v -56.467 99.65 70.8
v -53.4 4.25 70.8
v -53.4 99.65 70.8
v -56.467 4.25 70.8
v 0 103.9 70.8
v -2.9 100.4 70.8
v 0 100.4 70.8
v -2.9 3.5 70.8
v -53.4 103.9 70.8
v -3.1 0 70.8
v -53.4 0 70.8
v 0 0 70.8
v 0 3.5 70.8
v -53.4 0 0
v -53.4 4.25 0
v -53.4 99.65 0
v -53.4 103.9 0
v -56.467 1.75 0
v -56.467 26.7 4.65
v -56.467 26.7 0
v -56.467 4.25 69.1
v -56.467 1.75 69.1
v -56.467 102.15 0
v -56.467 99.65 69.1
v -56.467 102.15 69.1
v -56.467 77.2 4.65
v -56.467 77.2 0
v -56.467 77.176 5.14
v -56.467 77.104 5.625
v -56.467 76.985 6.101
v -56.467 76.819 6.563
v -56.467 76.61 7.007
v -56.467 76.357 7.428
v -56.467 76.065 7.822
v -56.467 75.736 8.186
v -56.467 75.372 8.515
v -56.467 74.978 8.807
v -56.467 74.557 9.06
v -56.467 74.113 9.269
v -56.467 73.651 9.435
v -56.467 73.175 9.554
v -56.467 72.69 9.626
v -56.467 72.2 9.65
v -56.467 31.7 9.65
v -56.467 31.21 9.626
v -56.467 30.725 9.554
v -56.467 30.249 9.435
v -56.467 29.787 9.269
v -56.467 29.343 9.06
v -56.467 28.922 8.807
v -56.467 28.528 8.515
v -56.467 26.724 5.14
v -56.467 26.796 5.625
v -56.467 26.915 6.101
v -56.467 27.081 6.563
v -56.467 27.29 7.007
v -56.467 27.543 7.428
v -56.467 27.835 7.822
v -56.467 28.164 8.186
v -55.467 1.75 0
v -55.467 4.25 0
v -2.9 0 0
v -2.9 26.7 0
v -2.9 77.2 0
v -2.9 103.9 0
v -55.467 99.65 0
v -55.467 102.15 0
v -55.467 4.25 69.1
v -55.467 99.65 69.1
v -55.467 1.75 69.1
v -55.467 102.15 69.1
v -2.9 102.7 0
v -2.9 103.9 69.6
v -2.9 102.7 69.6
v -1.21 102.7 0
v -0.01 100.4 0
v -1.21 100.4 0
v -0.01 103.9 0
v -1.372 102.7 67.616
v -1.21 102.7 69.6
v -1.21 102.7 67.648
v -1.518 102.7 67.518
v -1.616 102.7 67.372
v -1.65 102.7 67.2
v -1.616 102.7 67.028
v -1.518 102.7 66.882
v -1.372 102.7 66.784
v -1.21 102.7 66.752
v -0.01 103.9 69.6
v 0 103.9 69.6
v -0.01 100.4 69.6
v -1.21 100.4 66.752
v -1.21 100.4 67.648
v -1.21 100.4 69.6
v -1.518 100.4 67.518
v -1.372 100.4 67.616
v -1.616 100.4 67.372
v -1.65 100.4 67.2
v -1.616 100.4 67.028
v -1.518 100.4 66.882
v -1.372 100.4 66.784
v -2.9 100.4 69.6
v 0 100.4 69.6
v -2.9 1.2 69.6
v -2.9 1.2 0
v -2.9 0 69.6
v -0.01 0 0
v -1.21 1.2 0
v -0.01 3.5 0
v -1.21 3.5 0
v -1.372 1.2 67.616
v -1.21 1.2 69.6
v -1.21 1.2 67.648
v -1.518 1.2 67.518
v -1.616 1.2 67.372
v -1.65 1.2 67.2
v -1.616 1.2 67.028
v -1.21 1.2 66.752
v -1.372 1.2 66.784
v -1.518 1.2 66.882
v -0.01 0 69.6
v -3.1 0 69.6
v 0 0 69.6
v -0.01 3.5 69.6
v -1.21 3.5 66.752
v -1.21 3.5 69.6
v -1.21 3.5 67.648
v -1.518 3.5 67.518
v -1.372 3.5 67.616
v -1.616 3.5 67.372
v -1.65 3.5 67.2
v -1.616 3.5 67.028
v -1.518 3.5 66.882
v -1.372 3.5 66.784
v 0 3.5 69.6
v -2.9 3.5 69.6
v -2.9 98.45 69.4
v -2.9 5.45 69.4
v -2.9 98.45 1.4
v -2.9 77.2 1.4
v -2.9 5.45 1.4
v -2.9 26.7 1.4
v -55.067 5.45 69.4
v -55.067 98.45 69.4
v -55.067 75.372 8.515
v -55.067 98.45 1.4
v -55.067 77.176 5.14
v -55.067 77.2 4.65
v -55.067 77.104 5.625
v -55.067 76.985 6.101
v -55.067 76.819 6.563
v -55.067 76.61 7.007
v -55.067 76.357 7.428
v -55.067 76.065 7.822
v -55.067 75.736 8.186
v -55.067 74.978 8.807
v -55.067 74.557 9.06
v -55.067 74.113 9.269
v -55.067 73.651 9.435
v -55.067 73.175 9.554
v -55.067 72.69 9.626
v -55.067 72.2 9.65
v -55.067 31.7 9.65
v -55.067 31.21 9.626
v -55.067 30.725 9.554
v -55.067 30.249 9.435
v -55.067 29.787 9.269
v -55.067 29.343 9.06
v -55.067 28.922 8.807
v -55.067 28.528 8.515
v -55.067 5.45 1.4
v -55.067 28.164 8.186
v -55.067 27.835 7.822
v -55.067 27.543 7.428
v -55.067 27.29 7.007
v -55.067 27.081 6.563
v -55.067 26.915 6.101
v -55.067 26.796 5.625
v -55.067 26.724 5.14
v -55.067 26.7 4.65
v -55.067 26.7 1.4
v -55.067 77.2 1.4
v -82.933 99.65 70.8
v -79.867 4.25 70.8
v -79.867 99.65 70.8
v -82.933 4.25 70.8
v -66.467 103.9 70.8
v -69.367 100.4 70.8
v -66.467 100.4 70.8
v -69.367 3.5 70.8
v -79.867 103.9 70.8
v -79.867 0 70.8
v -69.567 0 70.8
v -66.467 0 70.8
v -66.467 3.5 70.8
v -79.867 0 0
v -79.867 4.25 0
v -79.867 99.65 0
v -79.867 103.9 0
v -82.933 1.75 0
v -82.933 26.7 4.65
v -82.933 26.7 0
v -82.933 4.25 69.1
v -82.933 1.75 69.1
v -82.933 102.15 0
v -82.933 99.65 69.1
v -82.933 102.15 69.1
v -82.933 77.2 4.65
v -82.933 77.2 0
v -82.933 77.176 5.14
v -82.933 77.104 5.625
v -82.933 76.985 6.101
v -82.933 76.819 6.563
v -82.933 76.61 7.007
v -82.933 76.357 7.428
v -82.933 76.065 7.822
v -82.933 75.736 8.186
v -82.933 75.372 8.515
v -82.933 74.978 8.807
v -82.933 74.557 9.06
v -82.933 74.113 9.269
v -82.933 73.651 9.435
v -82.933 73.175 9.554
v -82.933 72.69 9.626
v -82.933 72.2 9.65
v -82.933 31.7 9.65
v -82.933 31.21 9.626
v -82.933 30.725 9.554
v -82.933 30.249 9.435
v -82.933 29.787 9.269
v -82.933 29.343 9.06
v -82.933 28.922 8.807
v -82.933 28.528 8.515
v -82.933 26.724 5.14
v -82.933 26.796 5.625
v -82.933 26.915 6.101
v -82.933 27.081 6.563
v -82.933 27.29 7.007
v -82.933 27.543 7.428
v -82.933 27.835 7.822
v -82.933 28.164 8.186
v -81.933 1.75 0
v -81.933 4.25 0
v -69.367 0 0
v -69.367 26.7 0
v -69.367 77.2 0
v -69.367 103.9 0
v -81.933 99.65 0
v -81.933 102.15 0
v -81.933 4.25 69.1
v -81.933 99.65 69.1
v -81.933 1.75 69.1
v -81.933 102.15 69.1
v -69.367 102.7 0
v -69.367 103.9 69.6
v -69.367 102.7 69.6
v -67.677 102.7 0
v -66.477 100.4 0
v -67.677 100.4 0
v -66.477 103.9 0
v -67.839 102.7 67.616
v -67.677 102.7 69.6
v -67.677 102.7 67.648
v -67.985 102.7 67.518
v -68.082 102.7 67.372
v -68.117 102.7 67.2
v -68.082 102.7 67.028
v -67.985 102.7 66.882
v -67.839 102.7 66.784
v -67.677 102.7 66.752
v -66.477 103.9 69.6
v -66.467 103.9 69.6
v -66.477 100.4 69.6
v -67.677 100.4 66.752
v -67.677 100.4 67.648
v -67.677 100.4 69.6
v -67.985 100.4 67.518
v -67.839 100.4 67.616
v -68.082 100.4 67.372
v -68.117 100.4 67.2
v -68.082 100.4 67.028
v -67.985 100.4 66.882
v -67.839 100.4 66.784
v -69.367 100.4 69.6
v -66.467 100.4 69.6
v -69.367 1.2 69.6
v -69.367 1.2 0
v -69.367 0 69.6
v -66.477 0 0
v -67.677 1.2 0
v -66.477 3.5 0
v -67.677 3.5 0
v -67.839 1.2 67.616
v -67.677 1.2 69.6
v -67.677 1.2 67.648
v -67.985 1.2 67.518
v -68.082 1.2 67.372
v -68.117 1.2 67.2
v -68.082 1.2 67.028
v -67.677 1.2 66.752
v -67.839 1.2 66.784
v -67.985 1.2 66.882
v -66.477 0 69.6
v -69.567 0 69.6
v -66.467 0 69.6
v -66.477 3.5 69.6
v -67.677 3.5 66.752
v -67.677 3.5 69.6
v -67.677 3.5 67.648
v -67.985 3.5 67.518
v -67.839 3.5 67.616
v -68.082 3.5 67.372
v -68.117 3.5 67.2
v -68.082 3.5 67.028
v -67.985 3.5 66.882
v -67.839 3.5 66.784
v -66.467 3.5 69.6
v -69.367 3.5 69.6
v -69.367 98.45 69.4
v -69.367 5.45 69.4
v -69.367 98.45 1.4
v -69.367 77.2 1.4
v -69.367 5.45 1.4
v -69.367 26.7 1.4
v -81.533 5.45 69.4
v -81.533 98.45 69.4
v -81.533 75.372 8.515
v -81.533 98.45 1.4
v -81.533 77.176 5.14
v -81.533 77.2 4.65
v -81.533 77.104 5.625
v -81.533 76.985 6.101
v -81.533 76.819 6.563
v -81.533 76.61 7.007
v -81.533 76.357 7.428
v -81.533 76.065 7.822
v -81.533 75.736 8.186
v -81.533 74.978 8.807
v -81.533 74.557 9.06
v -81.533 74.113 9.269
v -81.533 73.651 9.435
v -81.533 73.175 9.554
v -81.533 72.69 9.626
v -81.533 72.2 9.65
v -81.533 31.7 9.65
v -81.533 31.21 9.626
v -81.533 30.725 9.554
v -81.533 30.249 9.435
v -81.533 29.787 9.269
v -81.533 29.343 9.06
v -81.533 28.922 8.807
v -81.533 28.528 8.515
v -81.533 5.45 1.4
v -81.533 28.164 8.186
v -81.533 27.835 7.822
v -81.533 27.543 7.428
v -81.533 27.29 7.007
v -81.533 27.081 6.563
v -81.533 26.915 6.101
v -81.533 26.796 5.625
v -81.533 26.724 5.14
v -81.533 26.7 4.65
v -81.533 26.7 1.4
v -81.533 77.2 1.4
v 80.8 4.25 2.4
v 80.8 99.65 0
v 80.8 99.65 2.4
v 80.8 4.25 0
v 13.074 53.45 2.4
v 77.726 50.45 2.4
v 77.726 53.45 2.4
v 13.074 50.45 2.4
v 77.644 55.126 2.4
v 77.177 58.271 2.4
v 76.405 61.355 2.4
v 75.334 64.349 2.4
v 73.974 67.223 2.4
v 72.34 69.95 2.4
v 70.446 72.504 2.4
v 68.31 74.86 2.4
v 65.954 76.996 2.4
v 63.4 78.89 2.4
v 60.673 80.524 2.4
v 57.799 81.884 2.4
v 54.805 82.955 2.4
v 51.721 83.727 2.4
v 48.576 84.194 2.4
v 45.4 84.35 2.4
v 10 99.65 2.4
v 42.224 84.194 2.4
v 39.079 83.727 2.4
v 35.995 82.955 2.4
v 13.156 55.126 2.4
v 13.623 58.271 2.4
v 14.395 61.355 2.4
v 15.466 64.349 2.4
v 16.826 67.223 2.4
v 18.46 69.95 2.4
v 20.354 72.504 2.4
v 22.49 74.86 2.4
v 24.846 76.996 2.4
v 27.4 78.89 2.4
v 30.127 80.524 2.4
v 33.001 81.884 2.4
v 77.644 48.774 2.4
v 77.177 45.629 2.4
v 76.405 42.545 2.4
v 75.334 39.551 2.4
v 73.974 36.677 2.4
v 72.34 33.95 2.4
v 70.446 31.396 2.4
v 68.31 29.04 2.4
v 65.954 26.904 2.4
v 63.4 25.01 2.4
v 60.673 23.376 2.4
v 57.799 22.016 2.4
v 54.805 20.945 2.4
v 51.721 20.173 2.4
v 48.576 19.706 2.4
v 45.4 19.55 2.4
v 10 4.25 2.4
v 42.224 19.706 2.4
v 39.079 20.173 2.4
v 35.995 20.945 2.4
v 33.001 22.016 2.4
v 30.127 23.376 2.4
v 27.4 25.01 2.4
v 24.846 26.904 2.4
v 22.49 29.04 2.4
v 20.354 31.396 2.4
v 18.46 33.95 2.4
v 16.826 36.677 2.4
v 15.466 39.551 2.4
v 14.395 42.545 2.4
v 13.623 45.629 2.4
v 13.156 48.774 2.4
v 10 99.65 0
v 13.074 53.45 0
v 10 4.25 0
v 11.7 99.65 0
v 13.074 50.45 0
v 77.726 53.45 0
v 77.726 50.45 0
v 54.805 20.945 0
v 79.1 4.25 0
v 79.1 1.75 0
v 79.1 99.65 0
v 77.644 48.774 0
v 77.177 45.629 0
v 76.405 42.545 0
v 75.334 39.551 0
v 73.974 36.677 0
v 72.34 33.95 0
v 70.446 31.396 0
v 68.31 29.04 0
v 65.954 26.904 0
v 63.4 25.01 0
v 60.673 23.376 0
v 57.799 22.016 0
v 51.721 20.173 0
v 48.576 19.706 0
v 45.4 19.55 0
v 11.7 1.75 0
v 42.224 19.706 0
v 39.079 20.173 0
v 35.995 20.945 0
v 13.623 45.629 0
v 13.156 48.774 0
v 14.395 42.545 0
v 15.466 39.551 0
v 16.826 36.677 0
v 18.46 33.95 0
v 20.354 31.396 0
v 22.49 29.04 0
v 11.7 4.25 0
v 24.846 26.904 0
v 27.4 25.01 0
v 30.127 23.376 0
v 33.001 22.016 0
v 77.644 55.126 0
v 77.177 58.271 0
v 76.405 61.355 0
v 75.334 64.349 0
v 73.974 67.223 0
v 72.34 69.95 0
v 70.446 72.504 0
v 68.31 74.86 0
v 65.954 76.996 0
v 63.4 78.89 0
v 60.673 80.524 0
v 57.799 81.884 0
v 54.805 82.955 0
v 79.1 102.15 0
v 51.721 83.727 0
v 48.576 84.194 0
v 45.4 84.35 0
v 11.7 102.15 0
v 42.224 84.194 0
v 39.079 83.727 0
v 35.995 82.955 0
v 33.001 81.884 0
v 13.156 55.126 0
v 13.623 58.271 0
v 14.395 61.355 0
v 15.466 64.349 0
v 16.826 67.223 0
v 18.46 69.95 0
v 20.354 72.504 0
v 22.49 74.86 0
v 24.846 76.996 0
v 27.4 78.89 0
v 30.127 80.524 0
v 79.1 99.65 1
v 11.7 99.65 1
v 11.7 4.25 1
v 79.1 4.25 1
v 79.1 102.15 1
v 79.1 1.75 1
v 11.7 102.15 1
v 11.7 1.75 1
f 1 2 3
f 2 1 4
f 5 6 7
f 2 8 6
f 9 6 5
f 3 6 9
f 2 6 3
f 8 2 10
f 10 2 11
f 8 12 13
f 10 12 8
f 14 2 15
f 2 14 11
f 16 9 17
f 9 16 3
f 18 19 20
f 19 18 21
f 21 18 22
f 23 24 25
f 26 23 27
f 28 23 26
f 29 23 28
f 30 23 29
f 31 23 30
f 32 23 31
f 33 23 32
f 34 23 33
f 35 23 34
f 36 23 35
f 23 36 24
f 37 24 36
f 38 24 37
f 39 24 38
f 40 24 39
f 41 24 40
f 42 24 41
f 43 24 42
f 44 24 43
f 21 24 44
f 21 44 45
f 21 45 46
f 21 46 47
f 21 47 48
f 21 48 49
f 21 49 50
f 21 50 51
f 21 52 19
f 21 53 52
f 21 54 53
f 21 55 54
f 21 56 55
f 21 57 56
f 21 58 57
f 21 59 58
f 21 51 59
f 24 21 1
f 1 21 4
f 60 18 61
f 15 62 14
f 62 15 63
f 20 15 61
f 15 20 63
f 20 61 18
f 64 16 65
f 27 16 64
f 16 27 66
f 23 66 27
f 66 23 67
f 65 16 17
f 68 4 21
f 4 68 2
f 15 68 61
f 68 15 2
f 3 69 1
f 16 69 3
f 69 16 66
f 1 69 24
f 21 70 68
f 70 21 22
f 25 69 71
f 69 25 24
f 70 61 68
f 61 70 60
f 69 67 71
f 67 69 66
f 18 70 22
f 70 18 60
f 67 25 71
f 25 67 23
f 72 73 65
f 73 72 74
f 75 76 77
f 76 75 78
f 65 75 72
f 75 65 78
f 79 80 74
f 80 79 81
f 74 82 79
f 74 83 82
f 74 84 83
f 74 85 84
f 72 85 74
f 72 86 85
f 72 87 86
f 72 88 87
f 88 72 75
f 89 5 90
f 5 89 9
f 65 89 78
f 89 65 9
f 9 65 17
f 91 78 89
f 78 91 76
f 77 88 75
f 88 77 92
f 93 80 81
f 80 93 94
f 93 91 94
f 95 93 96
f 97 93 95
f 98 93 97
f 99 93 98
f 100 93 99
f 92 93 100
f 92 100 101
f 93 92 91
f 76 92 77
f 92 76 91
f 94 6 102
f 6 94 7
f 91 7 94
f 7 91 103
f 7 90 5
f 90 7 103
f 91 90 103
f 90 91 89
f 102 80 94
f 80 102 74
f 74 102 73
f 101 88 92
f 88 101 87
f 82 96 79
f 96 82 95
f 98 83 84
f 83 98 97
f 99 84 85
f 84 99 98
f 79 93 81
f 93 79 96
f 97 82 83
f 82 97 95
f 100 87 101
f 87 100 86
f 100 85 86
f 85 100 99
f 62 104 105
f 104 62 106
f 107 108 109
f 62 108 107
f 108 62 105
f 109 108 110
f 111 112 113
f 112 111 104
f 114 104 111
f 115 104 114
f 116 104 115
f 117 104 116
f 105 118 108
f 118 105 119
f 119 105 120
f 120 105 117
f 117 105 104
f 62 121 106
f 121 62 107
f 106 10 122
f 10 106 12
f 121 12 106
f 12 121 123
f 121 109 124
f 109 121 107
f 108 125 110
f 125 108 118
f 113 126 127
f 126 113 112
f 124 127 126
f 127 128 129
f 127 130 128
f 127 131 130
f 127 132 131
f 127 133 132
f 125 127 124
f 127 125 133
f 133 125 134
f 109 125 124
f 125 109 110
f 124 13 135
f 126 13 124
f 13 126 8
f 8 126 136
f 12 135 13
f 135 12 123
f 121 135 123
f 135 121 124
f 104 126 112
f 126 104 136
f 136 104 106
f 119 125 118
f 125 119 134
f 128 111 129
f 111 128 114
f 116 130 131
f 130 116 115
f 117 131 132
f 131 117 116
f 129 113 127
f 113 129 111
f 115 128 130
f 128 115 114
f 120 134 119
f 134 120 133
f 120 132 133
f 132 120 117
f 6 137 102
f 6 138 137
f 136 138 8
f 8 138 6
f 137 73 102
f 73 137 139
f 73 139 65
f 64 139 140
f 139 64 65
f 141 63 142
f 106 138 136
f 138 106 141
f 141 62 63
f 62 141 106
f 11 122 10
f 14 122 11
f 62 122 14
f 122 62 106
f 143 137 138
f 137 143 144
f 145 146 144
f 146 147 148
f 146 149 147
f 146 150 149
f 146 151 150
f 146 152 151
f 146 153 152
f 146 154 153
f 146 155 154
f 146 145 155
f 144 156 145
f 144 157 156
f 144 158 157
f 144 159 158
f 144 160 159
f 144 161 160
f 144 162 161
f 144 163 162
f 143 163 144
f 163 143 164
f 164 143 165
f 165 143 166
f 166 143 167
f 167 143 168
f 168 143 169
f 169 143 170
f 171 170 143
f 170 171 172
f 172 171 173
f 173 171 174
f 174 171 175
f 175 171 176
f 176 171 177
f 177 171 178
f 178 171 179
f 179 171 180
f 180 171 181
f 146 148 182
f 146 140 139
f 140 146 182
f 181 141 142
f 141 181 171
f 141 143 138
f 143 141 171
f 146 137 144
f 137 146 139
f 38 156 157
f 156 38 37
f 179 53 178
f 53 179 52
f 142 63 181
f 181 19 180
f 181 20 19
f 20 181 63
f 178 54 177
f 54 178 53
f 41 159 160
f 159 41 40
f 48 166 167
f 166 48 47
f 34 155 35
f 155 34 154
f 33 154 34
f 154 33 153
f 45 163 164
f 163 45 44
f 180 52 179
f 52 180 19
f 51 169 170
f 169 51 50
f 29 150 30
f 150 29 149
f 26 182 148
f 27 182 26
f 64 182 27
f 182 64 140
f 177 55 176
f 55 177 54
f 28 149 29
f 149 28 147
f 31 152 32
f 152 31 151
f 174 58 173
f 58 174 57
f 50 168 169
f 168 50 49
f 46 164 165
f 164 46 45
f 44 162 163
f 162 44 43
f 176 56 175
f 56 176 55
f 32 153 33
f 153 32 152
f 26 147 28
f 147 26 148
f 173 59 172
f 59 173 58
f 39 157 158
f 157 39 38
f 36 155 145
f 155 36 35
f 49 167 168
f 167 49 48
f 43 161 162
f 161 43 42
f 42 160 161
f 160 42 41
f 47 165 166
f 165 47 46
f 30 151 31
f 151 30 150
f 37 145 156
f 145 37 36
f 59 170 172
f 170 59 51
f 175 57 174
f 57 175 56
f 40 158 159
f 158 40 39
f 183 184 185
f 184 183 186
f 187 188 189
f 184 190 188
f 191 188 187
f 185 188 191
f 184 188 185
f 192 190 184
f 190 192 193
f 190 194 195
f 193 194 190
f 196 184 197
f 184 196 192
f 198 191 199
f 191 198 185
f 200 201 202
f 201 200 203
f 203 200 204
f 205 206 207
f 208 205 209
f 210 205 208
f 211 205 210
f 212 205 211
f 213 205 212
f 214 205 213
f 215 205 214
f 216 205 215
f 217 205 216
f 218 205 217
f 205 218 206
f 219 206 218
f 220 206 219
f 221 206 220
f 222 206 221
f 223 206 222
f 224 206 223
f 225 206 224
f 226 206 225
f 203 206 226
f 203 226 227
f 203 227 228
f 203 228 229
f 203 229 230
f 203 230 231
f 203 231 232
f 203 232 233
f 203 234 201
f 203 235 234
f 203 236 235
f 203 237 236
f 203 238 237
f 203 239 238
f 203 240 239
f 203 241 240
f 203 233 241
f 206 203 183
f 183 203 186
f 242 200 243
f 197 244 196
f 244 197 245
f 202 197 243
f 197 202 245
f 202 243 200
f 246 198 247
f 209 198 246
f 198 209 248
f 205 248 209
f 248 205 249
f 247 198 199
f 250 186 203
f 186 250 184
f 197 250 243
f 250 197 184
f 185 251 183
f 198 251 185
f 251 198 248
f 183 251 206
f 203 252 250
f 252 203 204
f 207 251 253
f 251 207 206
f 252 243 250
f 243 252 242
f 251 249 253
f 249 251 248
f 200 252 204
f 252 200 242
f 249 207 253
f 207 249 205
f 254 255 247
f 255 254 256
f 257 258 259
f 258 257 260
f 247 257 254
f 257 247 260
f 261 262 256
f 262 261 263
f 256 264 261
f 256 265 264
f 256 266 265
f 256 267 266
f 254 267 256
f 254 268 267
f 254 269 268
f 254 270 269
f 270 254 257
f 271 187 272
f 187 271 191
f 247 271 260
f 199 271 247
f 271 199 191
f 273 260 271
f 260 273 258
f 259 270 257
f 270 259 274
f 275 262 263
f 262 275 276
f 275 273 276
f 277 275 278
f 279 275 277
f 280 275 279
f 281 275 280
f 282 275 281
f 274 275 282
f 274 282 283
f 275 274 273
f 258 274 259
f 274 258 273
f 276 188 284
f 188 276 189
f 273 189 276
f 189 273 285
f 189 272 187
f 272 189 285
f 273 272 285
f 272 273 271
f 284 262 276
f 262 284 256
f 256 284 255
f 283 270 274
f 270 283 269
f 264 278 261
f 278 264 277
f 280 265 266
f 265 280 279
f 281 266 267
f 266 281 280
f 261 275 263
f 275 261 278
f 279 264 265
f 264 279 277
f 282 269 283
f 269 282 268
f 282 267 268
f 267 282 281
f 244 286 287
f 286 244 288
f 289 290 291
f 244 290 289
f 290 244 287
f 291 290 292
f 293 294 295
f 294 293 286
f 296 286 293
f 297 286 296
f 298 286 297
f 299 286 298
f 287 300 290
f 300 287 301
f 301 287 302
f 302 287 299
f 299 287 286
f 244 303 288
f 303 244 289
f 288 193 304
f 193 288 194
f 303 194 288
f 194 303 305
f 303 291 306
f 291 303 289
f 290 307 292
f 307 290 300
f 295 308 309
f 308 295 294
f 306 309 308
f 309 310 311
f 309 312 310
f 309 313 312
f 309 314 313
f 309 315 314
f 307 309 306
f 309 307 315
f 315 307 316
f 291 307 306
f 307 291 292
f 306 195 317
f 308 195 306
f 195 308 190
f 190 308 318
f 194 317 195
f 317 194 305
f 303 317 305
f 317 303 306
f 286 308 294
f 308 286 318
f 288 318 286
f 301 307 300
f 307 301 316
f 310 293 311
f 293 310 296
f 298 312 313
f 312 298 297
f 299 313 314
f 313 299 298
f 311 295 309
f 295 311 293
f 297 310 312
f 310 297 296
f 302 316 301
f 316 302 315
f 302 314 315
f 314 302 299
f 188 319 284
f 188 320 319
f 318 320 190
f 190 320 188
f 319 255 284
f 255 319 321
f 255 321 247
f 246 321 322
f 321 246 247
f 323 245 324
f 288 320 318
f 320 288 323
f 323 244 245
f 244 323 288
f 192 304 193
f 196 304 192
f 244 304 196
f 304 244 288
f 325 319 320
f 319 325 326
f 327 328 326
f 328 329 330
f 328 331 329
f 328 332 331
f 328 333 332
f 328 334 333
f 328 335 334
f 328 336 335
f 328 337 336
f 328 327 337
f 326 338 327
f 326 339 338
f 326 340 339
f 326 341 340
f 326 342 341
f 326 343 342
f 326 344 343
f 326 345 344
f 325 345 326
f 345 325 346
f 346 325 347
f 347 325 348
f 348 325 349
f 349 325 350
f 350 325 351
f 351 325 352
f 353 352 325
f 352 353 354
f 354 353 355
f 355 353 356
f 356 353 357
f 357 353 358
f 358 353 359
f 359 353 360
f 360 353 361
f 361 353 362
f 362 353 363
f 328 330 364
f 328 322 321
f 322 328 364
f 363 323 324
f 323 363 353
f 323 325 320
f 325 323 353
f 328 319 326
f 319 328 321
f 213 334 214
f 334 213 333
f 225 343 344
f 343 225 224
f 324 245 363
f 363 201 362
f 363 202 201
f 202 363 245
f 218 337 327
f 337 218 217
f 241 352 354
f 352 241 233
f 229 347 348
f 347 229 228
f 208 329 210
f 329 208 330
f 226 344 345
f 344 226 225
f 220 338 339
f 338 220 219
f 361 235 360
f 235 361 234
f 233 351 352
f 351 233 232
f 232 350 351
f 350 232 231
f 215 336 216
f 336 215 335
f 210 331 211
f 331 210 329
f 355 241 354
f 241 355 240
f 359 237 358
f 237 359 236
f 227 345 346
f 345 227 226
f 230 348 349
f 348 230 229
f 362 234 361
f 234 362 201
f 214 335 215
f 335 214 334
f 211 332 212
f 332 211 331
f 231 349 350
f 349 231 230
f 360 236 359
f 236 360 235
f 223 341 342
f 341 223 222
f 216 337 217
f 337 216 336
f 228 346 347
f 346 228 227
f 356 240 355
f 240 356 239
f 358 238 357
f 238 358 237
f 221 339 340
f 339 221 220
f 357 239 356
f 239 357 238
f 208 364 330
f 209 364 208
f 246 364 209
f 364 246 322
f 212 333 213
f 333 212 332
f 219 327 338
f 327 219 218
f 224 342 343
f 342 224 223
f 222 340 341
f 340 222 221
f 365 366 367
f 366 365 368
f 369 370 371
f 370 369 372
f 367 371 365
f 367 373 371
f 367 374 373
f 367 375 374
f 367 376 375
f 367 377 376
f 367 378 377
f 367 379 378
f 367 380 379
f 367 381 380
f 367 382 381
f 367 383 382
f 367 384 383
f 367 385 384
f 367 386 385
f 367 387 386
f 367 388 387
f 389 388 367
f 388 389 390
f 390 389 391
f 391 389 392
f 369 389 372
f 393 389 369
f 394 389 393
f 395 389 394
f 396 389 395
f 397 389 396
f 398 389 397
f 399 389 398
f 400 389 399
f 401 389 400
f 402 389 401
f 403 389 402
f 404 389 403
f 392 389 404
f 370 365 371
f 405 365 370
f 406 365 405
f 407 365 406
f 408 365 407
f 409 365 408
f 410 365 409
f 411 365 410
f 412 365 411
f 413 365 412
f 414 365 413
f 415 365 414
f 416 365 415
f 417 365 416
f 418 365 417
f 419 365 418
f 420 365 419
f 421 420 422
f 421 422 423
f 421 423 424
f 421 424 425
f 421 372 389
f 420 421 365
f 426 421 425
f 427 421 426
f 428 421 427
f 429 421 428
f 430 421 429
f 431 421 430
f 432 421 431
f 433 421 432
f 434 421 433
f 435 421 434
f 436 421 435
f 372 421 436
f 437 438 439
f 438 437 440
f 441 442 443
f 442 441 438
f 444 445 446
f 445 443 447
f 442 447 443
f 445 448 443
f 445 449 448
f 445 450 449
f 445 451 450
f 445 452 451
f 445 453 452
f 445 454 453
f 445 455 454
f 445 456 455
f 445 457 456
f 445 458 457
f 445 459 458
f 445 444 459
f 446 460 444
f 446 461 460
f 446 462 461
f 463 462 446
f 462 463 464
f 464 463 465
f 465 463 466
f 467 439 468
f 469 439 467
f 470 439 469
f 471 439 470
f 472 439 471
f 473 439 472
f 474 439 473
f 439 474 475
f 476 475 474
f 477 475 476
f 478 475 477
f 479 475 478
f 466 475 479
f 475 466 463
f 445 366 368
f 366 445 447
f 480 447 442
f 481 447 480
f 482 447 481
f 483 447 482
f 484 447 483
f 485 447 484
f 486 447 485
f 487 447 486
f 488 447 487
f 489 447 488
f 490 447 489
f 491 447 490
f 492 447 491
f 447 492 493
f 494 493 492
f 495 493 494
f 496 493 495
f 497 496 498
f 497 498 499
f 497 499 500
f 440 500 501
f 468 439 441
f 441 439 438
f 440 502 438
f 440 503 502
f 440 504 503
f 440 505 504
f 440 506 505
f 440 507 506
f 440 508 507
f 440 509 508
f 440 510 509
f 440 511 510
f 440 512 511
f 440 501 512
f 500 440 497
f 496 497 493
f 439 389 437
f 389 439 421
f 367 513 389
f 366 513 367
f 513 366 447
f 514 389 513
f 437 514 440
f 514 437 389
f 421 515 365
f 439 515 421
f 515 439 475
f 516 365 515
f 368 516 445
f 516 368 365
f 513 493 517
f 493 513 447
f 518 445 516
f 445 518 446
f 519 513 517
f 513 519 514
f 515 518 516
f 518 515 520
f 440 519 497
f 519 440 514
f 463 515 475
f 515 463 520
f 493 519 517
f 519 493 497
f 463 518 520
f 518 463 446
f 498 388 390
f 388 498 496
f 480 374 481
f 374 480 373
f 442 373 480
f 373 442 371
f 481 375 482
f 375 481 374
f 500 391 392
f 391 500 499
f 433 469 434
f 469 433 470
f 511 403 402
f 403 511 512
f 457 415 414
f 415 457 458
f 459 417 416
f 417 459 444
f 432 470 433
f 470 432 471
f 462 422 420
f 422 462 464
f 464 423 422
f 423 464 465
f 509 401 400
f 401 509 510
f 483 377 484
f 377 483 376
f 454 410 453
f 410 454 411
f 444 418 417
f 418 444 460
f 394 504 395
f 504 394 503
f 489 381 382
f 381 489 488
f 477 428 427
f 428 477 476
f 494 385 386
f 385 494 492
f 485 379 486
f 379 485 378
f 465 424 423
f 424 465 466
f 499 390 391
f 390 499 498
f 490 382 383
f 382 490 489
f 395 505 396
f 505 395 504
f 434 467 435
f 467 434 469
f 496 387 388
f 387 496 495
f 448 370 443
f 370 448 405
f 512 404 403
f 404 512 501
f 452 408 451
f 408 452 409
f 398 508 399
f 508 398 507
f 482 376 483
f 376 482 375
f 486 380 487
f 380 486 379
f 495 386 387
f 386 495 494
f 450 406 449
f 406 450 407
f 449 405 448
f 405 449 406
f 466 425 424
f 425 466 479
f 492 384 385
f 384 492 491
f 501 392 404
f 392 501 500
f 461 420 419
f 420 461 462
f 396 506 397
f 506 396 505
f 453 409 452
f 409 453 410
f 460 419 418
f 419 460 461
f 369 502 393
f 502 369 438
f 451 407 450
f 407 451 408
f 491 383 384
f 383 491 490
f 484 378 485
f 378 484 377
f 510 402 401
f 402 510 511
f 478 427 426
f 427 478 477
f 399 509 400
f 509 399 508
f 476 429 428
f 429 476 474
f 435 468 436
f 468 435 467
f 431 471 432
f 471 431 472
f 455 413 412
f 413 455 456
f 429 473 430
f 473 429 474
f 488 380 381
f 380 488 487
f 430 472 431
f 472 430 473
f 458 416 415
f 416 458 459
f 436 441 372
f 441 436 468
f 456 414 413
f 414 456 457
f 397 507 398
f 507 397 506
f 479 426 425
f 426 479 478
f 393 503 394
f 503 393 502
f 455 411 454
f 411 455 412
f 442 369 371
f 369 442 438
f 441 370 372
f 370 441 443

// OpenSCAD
/*
 * Author:  Erwan Loisant
 * Original Author:  Jean Philippe Neumann
 * License: Creative Commons Attribution-ShareAlike 3.0 Unported License
 *          see http://creativecommons.org/licenses/by-sa/3.0/
 * URL:     http://www.thingiverse.com/thing:94611
 */
 
// MakerBot customizer settings:
// preview[view:south east, tilt:top diagonal]

/*
 * parameters
 */

/* [primary parameters] */

// how many lids to print
numberOfLids = 1;

// the length of your cards in mm
cardY = 91;
// the width of your cards in mm
cardX = 66;
// the height of the stack of cards you want to store in mm (one entry per holder)
cardStackZs = [50, 10];

// The fudge factor allows fine tuning the distances between parts in the lock and key mechanisms of the holder. The right value is highly dependent on your printer. Is everything fitting too tight? Try increasing the factor by 0.1. Is everything fitting too loose? Try decreasing the factor by 0.1.
fudgeFactor = 0.5;

/* [secondary parameters] */

longWallStrength = 1.4;
shortWallStrength = 1.2;
bottomWallStrength = 1.4;

// thickness of the lower part of the lock mechanism
lowerLockY = 1.2;
// height of the lower part of the lock mechanism
lowerLockZ = 1.7;
// thickness of the upper part of the lock mechanism
upperLockY = 3.5;
// height of the upper part of the lock mechanism
upperLockZ = 1.2;
// how high is the part of the lid that slides in the locks rail
keyRailZLid = 1.0;
// how high is the part of the holders body that slides in the locks rail
keyRailZBody = 1.0;

// how thick the bit of plastic is that blocks the end of the lock's rail
stopBitStrength = 1.2;
// the "lock nub" is a tiny bump near the end of the lock's rail that makes other holders or lids snap in. This variable sets the size of that nub.
lockNubRadius = 0.45;
// position of the "lock nub"
lockNubDistanceToCorner = 3*stopBitStrength;

// how much extra space to leave around cards
spaceAroundCard = 1;
// how strong the lid's grip is
lidGripStrength = 3;
// how alrge the hole in the lid is
lidHoleRadius = (cardX + 2*spaceAroundCard + 2*longWallStrength)/2 - lidGripStrength;

// distance between objects on the print bed
printDistance = 10;

/* derived parameters */
/* [Hidden] */

release = 1;

// holder main body parameters
bodyX = cardX + 2*spaceAroundCard + 2*longWallStrength;
bodyY = cardY + 2*spaceAroundCard + 2*shortWallStrength + 2*upperLockY + 3*fudgeFactor;

// lock, key and lid parameters
lockZ = lowerLockZ + upperLockZ;
keyZ = lowerLockZ + upperLockZ + fudgeFactor/3;
lidZ = lowerLockZ + upperLockZ - fudgeFactor;
keyRailX = bodyX - 2*stopBitStrength - 2*fudgeFactor;
keyRailY = upperLockY - lowerLockY + 0.7 - fudgeFactor;
keyMainY = cardY + 2*spaceAroundCard + 2*shortWallStrength;

// space around the card stack
cardSpaceX = cardX + 2*spaceAroundCard;
cardSpaceY = cardY + 2*spaceAroundCard;

// hole in the side of the holder
grabHoleX = longWallStrength + cardX/8;
grabHoleY = cardY * 1/2;

// Offset for each holder
holderZs = [ for (i = [0:1:len(cardStackZs)]) cardStackZs[i] + spaceAroundCard/2 + keyZ + lockZ];

/*
 * putting it all together
 */

 for (idx = [ 0 : len(cardStackZs) - 1 ] ) {
    cardStackZ = cardStackZs[idx];
    bodyZ = cardStackZ + spaceAroundCard/2;
    holderZ = holderZs[idx];
    offsetZ = sum(select(holderZs, [0:1:idx-1])) + (printDistance * idx);

    translate([-offsetZ,0,0])
    
	if(release == 1) {
		translate([-holderZ, bodyY, 0])
		rotate([0,-90,180])
		holder(bodyZ);
	} else {
		translate([-bodyX, 0, 0])
		holder(bodyZ);
	}
}

if(numberOfLids != 0) {
	for(i=[0:numberOfLids-1]) {
		translate([i*(printDistance + bodyX) + printDistance,0,0])
		lid();
	}
}

/*
 * functions
 */

function sum(v, i = 0, r = 0) = i < len(v) ? sum(v, i + 1, r + v[i]) : r;

function select(vector, indices) = [ for (index = indices) vector[index] ];

function offsetZ(position) = sum(select(holderZs, [0:1:position]));

/*
 * modules
 */

module lid() {
	union() {
		difference() {
			key(bodyX, keyMainY, lidZ, keyRailX, keyRailY, keyRailZLid, true);
			
			translate([bodyX/2, bodyY/2, -1])
			cylinder(h=lidZ+2, r=lidHoleRadius, $fn=64);
		}
		translate([0, (bodyY-lidGripStrength)/2,0])
		cube([bodyX, lidGripStrength ,lidZ]);
	}
}

module key(mainX, mainY, mainZ, railX, railY, railZ, lidMode) {
	railPartY = 2*railY + mainY;
	
	translate([(bodyX-mainX)/2, (bodyY-mainY)/2,0])
	union() {
		color([0.5,0.7,0.9])
		cube([mainX, mainY, mainZ]);
		
		color([0.7,0.7,0.9])
		translate([(mainX-railX)/2,(mainY-railPartY)/2,0])
		cube([railX, railPartY, railZ]);
		
		if(lidMode == false) {
			color([1,0,0])
			translate([0, -(railPartY-mainY)/2, 0])
			cube([(mainX-railX)/2,railPartY,railZ]);
		}
	}
}

module holder(bodyZ) {
	difference() {
		union() {
			key(bodyX, keyMainY, keyZ, keyRailX, keyRailY, keyRailZBody, false);
			
			translate([0,0,keyZ])
			cube([bodyX, bodyY, bodyZ]);
			
			translate([0,0,bodyZ+keyZ])
			lock(bodyX, lowerLockY, lowerLockZ, upperLockY, upperLockZ);
		}
		cardSpace(bodyZ);
		grabHole(bodyZ);
	}
}

module cardSpace(bodyZ) {
	color([1,0,0])
	translate([(bodyX-cardSpaceX)/2,(bodyY-cardSpaceY)/2,bottomWallStrength])
	cube([cardSpaceX, cardSpaceY, bodyZ+keyZ+bottomWallStrength]);
}

module grabHole(bodyZ) {
	cylinderRadius = 5;
	cubeX = grabHoleX-cylinderRadius;
	cubeY = grabHoleY-cylinderRadius;
	posY = (bodyY-cubeY)/2;
	
	$fn=64;
	translate([0, posY, -1])
	minkowski() {
		cube([cubeX, cubeY, bodyZ+keyZ+2]);
		cylinder(r=cylinderRadius, h=1);
	}
}

module lock() {
	union() {
		lockPart();
		mirror([0,1,0]) {
			translate([0,-bodyY,0])
			lockPart();
		}
	}
}

module lockPart() {
	union() {
		// lower lock
		color([0.9,0.4,0.3])
		cube([bodyX, lowerLockY, lowerLockZ]);
		
		// upper lock
		// subtracting 0.01 because of strange holes in the generated STL file
		translate([0,0,lowerLockZ-0.01])
		cube([bodyX, upperLockY, upperLockZ]);
		
		// stop bit
		color([0,1,0])
		// extra large lock bit / translate -Z because of strange holes in the generated STL file
		translate([bodyX-stopBitStrength, 0, -0.2])
		cube([stopBitStrength, upperLockY, lockZ+0.2]);
		
		// safety nub
		color([1,0,0])
		translate([bodyX-lockNubDistanceToCorner, upperLockY, lowerLockZ])
		rotate([90,0,0])
		cylinder(r=lockNubRadius, h=upperLockY, $fn=16);
	}
}
